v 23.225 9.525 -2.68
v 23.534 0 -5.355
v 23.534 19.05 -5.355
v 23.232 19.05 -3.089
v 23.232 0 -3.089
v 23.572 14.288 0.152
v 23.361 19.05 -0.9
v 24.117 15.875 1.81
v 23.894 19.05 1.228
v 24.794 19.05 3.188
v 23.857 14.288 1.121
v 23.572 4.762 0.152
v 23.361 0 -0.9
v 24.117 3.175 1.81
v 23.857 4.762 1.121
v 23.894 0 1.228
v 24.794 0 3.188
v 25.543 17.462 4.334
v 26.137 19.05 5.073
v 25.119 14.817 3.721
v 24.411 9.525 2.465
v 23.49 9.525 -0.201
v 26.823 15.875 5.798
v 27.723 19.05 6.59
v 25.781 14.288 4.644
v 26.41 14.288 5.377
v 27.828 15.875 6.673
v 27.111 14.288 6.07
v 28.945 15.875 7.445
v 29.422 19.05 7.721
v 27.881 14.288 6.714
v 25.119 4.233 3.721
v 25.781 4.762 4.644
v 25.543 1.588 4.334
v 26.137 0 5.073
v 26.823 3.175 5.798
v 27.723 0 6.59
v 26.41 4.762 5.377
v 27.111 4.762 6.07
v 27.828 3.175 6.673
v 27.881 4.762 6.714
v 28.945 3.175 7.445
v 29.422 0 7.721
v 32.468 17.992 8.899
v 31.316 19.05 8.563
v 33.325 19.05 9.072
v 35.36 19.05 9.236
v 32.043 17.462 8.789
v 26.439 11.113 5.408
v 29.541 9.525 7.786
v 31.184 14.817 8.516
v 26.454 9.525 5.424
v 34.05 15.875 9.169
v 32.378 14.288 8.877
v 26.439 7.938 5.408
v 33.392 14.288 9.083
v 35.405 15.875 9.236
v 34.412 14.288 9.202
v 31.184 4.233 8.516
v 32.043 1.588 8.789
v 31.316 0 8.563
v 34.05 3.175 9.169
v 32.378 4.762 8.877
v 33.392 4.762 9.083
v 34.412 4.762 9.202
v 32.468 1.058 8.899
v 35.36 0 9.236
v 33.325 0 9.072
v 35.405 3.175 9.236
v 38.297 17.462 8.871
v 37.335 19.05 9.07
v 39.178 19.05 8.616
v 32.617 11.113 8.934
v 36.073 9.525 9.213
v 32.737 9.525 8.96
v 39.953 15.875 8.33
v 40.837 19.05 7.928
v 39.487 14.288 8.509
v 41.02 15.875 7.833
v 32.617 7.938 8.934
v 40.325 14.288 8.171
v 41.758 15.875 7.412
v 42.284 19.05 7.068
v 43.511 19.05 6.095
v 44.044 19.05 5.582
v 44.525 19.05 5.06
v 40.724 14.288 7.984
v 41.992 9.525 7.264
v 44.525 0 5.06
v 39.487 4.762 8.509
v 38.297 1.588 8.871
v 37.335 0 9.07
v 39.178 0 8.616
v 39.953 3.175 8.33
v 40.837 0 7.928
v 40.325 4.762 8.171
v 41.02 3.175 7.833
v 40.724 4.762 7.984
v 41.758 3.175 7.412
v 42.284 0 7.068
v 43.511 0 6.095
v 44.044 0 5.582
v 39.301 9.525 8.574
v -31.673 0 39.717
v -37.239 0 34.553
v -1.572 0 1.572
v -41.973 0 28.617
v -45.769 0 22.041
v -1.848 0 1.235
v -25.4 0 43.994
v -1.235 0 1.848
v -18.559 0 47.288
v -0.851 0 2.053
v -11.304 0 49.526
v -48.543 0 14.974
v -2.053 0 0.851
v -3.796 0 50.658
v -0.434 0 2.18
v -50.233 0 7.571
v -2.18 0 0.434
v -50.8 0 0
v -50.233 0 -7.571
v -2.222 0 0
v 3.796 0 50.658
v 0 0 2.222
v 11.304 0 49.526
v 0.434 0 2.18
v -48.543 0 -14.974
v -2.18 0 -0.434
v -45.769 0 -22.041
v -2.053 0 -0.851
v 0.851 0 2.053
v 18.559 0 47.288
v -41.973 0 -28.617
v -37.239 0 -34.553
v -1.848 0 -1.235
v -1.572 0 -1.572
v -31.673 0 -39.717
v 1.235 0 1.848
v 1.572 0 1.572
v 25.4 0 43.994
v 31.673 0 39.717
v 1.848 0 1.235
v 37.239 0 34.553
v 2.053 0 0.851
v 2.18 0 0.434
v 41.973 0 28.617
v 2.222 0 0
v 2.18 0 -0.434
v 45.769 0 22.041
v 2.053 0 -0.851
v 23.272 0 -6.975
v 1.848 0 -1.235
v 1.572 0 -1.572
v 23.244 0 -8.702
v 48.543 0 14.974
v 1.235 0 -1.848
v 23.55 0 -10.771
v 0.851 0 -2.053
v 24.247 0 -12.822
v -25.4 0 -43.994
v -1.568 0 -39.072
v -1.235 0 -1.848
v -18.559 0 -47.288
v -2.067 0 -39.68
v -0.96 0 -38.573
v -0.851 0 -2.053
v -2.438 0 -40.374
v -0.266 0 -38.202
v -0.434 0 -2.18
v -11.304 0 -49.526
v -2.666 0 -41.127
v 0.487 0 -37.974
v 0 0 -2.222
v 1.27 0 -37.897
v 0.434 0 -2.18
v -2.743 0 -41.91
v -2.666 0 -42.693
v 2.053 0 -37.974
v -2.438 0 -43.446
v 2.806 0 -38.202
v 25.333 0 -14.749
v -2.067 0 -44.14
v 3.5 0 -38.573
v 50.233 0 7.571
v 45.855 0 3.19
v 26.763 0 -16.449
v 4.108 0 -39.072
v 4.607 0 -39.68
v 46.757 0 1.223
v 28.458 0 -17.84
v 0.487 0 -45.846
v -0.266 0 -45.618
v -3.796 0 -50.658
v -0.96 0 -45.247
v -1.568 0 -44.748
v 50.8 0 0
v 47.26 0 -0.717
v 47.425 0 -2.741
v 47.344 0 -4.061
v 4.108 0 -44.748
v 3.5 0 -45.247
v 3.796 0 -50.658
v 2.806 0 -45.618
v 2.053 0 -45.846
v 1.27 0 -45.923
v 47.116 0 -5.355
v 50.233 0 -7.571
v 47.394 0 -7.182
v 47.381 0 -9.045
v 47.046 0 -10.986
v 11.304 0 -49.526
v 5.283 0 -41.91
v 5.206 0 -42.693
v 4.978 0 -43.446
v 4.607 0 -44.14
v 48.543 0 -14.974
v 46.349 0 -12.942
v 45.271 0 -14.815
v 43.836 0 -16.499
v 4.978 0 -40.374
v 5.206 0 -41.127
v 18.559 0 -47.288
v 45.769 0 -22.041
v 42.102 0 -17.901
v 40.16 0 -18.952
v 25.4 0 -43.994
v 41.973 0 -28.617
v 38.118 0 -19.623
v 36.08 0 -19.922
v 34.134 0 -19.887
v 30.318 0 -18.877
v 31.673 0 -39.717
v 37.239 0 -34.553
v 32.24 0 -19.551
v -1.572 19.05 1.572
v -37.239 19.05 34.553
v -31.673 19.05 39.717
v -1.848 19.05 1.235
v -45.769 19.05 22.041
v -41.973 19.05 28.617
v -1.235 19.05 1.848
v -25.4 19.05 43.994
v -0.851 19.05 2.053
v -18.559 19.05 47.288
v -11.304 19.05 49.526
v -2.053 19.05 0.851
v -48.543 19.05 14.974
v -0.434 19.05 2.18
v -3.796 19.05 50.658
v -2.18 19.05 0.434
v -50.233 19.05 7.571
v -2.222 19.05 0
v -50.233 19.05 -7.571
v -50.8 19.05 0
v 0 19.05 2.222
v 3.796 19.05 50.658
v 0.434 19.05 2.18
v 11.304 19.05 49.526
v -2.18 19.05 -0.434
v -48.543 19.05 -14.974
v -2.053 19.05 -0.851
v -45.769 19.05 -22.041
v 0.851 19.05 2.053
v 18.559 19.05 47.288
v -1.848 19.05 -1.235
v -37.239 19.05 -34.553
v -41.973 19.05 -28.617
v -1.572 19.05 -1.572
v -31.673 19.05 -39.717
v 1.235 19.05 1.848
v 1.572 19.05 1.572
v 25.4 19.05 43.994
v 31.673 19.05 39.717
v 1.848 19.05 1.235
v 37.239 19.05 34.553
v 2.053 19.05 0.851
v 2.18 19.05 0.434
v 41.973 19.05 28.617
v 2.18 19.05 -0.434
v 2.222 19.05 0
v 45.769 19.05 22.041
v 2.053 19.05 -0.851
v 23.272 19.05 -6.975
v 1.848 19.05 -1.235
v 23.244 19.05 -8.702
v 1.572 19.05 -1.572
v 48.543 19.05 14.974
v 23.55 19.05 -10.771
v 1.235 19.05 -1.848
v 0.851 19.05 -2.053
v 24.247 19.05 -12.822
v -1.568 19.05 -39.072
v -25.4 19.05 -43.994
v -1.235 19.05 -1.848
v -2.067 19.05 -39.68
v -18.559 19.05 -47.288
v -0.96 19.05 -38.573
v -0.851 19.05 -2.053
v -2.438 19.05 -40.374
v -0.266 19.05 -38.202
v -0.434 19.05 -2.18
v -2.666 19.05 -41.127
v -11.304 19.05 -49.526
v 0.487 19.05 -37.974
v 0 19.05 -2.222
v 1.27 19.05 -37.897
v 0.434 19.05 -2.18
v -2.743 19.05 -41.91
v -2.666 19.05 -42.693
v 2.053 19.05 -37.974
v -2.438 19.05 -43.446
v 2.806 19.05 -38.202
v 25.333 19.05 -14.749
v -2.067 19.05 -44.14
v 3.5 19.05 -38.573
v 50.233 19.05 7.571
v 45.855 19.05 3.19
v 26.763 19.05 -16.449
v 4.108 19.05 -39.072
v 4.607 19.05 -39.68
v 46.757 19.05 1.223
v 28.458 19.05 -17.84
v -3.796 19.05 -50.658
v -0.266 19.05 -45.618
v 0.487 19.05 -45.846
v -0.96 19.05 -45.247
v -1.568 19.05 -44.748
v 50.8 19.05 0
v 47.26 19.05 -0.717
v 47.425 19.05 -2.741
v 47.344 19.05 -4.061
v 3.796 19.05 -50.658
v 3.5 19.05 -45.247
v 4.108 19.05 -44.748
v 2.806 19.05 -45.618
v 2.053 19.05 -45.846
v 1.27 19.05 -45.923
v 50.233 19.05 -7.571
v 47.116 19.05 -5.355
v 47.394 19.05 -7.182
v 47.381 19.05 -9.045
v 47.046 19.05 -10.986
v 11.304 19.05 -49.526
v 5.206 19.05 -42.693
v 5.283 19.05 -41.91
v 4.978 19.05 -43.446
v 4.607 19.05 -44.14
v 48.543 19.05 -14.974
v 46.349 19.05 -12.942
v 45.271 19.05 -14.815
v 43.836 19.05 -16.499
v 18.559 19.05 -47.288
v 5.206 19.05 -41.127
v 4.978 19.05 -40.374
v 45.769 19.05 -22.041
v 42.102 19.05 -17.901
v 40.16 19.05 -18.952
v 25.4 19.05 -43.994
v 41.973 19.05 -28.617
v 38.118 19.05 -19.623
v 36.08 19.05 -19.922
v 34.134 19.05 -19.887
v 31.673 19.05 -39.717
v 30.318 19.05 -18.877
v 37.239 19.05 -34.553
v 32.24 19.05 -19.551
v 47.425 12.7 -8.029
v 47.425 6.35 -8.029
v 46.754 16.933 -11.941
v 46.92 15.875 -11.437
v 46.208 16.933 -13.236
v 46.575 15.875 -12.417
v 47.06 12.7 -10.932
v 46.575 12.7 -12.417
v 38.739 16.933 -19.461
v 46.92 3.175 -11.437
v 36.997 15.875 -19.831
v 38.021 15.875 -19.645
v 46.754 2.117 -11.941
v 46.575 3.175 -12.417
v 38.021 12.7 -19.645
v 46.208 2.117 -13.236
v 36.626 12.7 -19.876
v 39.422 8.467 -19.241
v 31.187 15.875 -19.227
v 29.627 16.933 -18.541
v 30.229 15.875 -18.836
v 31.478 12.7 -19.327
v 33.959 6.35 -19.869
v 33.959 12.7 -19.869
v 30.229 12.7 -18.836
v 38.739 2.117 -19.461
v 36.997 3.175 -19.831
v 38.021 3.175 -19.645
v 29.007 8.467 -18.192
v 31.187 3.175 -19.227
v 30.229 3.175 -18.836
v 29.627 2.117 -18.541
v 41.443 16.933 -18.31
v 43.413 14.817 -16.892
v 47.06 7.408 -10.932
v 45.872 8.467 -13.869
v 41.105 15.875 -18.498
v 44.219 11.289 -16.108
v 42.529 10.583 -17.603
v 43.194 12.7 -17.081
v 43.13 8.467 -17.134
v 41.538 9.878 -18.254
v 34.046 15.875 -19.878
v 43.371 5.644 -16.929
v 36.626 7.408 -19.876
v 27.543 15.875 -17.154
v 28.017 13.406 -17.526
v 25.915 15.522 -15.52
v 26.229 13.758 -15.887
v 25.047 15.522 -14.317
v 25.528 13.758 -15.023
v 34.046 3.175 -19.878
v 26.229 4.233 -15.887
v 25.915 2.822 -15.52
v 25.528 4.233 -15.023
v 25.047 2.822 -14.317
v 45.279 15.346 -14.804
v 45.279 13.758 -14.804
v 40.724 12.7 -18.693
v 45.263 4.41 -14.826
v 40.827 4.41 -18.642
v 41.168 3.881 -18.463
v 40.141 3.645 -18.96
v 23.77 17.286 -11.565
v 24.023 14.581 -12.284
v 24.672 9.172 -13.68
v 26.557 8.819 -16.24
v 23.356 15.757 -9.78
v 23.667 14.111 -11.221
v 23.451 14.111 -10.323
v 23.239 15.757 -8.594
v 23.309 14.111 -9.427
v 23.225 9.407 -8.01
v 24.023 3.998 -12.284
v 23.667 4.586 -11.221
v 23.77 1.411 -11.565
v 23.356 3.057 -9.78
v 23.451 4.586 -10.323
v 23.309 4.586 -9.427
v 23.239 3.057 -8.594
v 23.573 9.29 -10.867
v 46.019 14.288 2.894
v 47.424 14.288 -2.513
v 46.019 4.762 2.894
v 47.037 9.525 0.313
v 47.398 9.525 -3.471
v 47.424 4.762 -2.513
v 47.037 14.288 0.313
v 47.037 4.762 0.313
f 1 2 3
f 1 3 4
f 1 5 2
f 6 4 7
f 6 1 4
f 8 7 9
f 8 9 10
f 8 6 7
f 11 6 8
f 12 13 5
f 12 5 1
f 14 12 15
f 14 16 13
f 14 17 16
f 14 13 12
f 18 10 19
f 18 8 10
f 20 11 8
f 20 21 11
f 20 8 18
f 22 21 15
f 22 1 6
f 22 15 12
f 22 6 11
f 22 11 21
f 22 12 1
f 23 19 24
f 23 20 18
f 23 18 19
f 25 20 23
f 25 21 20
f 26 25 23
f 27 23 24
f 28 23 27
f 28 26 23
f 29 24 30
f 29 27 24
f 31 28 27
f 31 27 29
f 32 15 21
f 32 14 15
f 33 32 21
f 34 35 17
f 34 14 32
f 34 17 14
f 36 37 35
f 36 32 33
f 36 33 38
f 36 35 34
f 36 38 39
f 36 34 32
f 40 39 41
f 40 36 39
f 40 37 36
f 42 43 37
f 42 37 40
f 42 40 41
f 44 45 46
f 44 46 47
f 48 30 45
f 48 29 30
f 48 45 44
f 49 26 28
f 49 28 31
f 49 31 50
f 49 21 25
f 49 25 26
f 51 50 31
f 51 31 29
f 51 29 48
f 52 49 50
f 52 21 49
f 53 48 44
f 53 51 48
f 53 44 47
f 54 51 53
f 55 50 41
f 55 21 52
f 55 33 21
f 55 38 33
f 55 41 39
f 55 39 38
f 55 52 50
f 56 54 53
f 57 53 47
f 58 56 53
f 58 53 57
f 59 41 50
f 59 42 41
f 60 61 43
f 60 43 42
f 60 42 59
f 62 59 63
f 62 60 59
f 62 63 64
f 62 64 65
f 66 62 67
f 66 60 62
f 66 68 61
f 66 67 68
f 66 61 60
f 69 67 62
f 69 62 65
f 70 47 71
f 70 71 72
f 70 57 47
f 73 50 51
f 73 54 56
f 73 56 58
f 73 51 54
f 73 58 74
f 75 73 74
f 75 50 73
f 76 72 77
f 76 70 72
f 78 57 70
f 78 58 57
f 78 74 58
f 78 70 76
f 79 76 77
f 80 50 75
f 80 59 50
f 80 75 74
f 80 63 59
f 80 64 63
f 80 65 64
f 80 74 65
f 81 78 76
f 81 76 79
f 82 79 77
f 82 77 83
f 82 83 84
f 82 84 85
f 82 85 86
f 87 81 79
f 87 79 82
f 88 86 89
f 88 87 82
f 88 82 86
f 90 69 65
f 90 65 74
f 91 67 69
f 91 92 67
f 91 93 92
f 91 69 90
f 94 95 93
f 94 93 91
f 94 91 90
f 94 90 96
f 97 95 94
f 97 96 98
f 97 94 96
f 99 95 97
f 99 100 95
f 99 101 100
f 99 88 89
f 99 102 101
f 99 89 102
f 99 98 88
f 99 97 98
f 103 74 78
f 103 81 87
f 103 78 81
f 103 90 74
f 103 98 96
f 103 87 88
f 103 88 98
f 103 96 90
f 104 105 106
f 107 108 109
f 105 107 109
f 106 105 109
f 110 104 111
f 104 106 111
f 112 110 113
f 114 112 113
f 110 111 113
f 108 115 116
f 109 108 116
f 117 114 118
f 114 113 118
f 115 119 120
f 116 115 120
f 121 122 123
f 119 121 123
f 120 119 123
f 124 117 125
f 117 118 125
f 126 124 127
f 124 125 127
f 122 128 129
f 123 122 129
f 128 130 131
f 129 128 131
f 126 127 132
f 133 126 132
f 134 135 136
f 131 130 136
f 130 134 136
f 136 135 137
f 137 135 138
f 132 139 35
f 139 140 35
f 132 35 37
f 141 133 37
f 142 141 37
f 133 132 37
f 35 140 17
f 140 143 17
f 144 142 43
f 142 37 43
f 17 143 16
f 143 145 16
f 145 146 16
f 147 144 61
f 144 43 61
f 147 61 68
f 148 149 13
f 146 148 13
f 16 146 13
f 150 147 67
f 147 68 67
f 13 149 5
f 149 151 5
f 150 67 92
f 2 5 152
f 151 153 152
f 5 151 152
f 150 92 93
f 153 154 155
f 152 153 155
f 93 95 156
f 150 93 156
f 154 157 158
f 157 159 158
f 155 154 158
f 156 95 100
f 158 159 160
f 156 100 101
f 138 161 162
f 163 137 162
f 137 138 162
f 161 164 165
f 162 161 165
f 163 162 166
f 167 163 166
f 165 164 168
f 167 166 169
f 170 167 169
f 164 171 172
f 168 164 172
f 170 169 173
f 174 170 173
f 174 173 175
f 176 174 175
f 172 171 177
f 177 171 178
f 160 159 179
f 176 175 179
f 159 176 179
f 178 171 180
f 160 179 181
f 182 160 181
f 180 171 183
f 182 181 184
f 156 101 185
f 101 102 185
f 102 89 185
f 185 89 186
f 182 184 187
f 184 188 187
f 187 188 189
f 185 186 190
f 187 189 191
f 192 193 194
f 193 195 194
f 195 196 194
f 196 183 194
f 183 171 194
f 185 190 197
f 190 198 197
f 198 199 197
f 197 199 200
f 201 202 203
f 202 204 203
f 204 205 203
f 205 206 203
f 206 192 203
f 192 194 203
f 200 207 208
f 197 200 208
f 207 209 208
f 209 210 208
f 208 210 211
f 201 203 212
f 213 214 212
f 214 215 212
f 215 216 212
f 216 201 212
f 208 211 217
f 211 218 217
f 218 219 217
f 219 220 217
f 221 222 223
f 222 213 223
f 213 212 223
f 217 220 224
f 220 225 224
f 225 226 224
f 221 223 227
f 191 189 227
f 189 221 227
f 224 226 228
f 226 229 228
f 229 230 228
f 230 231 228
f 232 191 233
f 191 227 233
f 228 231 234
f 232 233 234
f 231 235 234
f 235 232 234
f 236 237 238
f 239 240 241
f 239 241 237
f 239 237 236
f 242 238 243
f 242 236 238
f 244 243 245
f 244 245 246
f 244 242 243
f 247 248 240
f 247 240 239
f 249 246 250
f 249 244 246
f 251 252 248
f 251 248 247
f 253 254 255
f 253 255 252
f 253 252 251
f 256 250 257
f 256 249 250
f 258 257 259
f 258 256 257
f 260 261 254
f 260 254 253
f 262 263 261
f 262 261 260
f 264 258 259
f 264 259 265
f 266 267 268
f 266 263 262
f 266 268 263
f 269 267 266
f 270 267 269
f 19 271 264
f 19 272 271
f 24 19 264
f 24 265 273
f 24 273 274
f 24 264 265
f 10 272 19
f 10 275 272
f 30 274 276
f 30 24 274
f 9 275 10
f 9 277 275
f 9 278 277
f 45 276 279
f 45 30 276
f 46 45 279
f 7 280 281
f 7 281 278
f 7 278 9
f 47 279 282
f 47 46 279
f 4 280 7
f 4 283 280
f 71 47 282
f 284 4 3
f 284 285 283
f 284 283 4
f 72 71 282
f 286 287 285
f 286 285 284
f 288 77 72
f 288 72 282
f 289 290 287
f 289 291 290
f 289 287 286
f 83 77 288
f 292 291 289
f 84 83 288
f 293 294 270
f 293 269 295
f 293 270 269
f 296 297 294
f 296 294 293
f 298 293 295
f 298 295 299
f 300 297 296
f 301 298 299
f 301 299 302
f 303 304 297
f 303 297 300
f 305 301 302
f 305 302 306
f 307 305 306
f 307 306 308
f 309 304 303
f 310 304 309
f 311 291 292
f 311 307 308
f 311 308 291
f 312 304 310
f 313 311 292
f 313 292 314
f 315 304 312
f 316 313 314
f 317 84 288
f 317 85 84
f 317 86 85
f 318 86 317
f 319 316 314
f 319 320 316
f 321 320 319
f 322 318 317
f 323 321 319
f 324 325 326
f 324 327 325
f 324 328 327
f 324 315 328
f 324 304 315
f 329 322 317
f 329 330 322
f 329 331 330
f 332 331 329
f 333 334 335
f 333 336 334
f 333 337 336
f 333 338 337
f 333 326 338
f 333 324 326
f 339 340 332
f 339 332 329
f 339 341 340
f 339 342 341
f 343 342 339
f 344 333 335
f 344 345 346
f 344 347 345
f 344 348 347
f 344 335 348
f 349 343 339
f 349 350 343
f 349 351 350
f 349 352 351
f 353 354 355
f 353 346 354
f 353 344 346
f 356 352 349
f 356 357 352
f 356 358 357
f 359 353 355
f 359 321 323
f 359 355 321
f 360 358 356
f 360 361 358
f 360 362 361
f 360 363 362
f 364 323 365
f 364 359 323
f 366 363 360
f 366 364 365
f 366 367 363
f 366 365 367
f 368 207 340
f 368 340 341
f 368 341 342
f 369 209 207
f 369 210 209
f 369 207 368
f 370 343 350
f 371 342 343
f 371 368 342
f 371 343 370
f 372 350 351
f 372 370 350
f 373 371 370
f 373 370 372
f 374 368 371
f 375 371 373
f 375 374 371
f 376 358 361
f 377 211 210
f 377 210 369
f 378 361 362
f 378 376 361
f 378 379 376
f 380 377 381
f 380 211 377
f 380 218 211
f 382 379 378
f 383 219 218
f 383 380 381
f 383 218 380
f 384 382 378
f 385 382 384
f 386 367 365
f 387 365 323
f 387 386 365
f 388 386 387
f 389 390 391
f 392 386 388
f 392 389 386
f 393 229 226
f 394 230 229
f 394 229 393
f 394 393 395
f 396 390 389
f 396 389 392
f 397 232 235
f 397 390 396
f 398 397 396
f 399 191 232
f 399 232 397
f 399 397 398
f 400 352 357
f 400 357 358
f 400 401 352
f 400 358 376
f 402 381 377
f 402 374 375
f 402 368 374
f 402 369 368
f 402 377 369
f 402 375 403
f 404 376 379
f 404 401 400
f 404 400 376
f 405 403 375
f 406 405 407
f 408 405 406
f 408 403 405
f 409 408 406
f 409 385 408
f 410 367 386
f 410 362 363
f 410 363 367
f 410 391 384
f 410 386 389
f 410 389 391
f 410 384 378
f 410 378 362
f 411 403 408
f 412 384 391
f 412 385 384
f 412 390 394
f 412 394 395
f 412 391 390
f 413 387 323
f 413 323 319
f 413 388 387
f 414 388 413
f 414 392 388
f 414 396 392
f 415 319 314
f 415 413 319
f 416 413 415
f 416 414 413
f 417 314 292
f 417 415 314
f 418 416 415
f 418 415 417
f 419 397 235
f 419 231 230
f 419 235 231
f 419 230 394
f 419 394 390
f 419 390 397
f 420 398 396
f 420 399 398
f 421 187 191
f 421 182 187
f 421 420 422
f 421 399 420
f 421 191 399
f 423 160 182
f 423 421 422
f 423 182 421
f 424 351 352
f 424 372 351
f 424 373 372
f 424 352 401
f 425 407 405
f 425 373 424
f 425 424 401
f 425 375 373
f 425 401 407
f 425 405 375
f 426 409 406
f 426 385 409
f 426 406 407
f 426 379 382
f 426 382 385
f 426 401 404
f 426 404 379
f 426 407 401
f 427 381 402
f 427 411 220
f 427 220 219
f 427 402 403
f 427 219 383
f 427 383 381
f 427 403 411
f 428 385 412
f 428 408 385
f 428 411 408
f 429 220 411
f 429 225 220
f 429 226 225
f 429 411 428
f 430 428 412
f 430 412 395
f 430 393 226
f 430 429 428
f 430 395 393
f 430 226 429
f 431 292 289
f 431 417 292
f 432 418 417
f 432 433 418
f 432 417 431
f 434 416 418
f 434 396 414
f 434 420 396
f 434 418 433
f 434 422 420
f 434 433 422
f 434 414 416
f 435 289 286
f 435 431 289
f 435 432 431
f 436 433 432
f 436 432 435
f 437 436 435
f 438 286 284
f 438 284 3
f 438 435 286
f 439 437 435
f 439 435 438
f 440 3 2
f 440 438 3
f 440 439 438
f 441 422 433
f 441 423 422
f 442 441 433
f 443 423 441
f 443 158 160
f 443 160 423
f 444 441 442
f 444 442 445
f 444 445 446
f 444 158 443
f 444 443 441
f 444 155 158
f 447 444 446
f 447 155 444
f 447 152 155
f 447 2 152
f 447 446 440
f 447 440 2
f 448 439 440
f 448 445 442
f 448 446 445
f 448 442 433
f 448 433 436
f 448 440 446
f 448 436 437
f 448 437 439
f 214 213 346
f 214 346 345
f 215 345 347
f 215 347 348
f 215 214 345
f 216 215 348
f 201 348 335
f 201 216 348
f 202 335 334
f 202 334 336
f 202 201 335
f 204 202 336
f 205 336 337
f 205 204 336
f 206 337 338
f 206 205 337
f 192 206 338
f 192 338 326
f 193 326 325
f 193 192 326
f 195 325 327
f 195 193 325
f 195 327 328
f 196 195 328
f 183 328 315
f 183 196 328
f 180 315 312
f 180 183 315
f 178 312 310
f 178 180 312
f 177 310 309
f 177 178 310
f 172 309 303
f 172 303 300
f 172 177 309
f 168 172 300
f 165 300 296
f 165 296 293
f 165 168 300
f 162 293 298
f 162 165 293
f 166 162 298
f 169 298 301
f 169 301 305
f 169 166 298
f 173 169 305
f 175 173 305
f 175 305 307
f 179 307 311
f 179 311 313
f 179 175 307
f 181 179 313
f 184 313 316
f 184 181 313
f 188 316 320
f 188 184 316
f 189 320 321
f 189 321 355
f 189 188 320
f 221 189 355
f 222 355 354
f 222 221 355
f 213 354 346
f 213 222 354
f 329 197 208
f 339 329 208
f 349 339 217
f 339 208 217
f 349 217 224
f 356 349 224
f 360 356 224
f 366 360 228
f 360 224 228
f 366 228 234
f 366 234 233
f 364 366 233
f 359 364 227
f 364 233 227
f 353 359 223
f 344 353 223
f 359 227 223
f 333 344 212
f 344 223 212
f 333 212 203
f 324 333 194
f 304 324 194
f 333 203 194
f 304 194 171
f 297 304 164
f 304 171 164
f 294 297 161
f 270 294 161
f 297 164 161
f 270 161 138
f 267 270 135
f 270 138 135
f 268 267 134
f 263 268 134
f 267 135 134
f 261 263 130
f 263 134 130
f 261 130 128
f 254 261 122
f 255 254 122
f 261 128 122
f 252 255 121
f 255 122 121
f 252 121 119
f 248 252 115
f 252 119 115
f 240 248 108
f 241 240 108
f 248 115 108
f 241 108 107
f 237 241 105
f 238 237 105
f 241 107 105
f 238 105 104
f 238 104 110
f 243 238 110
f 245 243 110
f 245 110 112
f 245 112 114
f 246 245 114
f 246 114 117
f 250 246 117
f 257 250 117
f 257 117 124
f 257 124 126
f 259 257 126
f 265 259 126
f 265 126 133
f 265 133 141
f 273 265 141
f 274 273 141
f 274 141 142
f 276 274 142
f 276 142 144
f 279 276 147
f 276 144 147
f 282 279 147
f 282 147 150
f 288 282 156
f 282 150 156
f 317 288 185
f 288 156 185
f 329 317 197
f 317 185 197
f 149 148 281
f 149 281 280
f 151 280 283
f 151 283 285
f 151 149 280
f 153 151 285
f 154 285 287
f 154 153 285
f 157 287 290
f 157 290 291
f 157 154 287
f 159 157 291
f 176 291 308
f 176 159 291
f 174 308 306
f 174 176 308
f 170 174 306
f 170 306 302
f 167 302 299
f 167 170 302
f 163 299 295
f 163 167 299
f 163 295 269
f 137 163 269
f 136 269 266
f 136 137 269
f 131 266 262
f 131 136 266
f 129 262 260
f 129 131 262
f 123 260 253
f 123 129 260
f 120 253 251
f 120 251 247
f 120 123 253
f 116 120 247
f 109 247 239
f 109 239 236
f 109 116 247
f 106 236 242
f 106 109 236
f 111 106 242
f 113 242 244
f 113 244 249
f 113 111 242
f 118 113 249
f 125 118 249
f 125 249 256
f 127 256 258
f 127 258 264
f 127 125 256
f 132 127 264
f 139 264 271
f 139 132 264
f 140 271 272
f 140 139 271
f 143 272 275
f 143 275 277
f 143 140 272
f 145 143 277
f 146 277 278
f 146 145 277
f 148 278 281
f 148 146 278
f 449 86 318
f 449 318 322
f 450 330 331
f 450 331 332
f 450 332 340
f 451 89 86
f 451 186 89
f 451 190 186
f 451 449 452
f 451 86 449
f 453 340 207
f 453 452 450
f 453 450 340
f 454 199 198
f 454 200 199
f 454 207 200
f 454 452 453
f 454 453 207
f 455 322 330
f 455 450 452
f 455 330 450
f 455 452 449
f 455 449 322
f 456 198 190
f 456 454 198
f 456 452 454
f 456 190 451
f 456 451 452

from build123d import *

# Parameters (mm, degrees)
SKETCH1_R           = 50.8
SKETCH1_R_2         = 2.2225
SKETCH1_R_3         = 4.0132
BOSS_EXTRUDE1_DEPTH = 19.05


with BuildPart() as part:
    # Sketch1 → Boss-Extrude1 (new body)
    with BuildSketch(Plane(origin=(0, 0, 0), x_dir=(1, 0, 0), z_dir=(0, 1, 0))):
        Circle(SKETCH1_R)
        Circle(SKETCH1_R_2, mode=Mode.SUBTRACT)
        with BuildLine():
            add(Edge.make_bspline(
                [(47.425, 8.028719366), (47.425, 21.375976625), (33.958540857, 19.868664087), (20.492081715, 18.361351549), (23.533629849, 5.35453743)],
                knots=[0, 0, 0, 1.683968262, 1.683968262, 3.367936524, 3.367936524, 3.367936524], degree=2, weights=[1, 0.665984043, 1, 0.665984043, 1]))
            add(Edge.make_bspline(
                [(47.116370151, 5.35453743), (47.425, 6.674355793), (47.425, 8.028719366)],
                knots=[6.056841437, 6.056841437, 6.056841437, 6.283185307, 6.283185307, 6.283185307], degree=2, weights=[1, 0.993602889, 1]))
            add(Edge.make_bspline(
                [(44.525, -5.059632012), (48.484325385, -0.495358305), (47.116370151, 5.35453743)],
                knots=[5.576210889, 5.576210889, 5.576210889, 6.500952743, 6.500952743, 6.500952743], degree=2, weights=[1, 0.843252924, 0.891535306]))
            add(Edge.make_bspline(
                [(23.533629849, 5.35453743), (23.225, 4.034719066), (23.225, 2.680355494), (23.225, -29.614075135), (44.525, -5.059632012)],
                knots=[2.868291657, 2.868291657, 2.868291657, 3.141592654, 3.141592654, 5.576210889, 5.576210889, 5.576210889], degree=2, weights=[0.869685773, 0.926603696, 1, 0.346171505, 1]))
        make_face(mode=Mode.SUBTRACT)
        with Locations((1.27, 41.91)):
            Circle(SKETCH1_R_3, mode=Mode.SUBTRACT)
    extrude(amount=BOSS_EXTRUDE1_DEPTH)


solid = part.part
